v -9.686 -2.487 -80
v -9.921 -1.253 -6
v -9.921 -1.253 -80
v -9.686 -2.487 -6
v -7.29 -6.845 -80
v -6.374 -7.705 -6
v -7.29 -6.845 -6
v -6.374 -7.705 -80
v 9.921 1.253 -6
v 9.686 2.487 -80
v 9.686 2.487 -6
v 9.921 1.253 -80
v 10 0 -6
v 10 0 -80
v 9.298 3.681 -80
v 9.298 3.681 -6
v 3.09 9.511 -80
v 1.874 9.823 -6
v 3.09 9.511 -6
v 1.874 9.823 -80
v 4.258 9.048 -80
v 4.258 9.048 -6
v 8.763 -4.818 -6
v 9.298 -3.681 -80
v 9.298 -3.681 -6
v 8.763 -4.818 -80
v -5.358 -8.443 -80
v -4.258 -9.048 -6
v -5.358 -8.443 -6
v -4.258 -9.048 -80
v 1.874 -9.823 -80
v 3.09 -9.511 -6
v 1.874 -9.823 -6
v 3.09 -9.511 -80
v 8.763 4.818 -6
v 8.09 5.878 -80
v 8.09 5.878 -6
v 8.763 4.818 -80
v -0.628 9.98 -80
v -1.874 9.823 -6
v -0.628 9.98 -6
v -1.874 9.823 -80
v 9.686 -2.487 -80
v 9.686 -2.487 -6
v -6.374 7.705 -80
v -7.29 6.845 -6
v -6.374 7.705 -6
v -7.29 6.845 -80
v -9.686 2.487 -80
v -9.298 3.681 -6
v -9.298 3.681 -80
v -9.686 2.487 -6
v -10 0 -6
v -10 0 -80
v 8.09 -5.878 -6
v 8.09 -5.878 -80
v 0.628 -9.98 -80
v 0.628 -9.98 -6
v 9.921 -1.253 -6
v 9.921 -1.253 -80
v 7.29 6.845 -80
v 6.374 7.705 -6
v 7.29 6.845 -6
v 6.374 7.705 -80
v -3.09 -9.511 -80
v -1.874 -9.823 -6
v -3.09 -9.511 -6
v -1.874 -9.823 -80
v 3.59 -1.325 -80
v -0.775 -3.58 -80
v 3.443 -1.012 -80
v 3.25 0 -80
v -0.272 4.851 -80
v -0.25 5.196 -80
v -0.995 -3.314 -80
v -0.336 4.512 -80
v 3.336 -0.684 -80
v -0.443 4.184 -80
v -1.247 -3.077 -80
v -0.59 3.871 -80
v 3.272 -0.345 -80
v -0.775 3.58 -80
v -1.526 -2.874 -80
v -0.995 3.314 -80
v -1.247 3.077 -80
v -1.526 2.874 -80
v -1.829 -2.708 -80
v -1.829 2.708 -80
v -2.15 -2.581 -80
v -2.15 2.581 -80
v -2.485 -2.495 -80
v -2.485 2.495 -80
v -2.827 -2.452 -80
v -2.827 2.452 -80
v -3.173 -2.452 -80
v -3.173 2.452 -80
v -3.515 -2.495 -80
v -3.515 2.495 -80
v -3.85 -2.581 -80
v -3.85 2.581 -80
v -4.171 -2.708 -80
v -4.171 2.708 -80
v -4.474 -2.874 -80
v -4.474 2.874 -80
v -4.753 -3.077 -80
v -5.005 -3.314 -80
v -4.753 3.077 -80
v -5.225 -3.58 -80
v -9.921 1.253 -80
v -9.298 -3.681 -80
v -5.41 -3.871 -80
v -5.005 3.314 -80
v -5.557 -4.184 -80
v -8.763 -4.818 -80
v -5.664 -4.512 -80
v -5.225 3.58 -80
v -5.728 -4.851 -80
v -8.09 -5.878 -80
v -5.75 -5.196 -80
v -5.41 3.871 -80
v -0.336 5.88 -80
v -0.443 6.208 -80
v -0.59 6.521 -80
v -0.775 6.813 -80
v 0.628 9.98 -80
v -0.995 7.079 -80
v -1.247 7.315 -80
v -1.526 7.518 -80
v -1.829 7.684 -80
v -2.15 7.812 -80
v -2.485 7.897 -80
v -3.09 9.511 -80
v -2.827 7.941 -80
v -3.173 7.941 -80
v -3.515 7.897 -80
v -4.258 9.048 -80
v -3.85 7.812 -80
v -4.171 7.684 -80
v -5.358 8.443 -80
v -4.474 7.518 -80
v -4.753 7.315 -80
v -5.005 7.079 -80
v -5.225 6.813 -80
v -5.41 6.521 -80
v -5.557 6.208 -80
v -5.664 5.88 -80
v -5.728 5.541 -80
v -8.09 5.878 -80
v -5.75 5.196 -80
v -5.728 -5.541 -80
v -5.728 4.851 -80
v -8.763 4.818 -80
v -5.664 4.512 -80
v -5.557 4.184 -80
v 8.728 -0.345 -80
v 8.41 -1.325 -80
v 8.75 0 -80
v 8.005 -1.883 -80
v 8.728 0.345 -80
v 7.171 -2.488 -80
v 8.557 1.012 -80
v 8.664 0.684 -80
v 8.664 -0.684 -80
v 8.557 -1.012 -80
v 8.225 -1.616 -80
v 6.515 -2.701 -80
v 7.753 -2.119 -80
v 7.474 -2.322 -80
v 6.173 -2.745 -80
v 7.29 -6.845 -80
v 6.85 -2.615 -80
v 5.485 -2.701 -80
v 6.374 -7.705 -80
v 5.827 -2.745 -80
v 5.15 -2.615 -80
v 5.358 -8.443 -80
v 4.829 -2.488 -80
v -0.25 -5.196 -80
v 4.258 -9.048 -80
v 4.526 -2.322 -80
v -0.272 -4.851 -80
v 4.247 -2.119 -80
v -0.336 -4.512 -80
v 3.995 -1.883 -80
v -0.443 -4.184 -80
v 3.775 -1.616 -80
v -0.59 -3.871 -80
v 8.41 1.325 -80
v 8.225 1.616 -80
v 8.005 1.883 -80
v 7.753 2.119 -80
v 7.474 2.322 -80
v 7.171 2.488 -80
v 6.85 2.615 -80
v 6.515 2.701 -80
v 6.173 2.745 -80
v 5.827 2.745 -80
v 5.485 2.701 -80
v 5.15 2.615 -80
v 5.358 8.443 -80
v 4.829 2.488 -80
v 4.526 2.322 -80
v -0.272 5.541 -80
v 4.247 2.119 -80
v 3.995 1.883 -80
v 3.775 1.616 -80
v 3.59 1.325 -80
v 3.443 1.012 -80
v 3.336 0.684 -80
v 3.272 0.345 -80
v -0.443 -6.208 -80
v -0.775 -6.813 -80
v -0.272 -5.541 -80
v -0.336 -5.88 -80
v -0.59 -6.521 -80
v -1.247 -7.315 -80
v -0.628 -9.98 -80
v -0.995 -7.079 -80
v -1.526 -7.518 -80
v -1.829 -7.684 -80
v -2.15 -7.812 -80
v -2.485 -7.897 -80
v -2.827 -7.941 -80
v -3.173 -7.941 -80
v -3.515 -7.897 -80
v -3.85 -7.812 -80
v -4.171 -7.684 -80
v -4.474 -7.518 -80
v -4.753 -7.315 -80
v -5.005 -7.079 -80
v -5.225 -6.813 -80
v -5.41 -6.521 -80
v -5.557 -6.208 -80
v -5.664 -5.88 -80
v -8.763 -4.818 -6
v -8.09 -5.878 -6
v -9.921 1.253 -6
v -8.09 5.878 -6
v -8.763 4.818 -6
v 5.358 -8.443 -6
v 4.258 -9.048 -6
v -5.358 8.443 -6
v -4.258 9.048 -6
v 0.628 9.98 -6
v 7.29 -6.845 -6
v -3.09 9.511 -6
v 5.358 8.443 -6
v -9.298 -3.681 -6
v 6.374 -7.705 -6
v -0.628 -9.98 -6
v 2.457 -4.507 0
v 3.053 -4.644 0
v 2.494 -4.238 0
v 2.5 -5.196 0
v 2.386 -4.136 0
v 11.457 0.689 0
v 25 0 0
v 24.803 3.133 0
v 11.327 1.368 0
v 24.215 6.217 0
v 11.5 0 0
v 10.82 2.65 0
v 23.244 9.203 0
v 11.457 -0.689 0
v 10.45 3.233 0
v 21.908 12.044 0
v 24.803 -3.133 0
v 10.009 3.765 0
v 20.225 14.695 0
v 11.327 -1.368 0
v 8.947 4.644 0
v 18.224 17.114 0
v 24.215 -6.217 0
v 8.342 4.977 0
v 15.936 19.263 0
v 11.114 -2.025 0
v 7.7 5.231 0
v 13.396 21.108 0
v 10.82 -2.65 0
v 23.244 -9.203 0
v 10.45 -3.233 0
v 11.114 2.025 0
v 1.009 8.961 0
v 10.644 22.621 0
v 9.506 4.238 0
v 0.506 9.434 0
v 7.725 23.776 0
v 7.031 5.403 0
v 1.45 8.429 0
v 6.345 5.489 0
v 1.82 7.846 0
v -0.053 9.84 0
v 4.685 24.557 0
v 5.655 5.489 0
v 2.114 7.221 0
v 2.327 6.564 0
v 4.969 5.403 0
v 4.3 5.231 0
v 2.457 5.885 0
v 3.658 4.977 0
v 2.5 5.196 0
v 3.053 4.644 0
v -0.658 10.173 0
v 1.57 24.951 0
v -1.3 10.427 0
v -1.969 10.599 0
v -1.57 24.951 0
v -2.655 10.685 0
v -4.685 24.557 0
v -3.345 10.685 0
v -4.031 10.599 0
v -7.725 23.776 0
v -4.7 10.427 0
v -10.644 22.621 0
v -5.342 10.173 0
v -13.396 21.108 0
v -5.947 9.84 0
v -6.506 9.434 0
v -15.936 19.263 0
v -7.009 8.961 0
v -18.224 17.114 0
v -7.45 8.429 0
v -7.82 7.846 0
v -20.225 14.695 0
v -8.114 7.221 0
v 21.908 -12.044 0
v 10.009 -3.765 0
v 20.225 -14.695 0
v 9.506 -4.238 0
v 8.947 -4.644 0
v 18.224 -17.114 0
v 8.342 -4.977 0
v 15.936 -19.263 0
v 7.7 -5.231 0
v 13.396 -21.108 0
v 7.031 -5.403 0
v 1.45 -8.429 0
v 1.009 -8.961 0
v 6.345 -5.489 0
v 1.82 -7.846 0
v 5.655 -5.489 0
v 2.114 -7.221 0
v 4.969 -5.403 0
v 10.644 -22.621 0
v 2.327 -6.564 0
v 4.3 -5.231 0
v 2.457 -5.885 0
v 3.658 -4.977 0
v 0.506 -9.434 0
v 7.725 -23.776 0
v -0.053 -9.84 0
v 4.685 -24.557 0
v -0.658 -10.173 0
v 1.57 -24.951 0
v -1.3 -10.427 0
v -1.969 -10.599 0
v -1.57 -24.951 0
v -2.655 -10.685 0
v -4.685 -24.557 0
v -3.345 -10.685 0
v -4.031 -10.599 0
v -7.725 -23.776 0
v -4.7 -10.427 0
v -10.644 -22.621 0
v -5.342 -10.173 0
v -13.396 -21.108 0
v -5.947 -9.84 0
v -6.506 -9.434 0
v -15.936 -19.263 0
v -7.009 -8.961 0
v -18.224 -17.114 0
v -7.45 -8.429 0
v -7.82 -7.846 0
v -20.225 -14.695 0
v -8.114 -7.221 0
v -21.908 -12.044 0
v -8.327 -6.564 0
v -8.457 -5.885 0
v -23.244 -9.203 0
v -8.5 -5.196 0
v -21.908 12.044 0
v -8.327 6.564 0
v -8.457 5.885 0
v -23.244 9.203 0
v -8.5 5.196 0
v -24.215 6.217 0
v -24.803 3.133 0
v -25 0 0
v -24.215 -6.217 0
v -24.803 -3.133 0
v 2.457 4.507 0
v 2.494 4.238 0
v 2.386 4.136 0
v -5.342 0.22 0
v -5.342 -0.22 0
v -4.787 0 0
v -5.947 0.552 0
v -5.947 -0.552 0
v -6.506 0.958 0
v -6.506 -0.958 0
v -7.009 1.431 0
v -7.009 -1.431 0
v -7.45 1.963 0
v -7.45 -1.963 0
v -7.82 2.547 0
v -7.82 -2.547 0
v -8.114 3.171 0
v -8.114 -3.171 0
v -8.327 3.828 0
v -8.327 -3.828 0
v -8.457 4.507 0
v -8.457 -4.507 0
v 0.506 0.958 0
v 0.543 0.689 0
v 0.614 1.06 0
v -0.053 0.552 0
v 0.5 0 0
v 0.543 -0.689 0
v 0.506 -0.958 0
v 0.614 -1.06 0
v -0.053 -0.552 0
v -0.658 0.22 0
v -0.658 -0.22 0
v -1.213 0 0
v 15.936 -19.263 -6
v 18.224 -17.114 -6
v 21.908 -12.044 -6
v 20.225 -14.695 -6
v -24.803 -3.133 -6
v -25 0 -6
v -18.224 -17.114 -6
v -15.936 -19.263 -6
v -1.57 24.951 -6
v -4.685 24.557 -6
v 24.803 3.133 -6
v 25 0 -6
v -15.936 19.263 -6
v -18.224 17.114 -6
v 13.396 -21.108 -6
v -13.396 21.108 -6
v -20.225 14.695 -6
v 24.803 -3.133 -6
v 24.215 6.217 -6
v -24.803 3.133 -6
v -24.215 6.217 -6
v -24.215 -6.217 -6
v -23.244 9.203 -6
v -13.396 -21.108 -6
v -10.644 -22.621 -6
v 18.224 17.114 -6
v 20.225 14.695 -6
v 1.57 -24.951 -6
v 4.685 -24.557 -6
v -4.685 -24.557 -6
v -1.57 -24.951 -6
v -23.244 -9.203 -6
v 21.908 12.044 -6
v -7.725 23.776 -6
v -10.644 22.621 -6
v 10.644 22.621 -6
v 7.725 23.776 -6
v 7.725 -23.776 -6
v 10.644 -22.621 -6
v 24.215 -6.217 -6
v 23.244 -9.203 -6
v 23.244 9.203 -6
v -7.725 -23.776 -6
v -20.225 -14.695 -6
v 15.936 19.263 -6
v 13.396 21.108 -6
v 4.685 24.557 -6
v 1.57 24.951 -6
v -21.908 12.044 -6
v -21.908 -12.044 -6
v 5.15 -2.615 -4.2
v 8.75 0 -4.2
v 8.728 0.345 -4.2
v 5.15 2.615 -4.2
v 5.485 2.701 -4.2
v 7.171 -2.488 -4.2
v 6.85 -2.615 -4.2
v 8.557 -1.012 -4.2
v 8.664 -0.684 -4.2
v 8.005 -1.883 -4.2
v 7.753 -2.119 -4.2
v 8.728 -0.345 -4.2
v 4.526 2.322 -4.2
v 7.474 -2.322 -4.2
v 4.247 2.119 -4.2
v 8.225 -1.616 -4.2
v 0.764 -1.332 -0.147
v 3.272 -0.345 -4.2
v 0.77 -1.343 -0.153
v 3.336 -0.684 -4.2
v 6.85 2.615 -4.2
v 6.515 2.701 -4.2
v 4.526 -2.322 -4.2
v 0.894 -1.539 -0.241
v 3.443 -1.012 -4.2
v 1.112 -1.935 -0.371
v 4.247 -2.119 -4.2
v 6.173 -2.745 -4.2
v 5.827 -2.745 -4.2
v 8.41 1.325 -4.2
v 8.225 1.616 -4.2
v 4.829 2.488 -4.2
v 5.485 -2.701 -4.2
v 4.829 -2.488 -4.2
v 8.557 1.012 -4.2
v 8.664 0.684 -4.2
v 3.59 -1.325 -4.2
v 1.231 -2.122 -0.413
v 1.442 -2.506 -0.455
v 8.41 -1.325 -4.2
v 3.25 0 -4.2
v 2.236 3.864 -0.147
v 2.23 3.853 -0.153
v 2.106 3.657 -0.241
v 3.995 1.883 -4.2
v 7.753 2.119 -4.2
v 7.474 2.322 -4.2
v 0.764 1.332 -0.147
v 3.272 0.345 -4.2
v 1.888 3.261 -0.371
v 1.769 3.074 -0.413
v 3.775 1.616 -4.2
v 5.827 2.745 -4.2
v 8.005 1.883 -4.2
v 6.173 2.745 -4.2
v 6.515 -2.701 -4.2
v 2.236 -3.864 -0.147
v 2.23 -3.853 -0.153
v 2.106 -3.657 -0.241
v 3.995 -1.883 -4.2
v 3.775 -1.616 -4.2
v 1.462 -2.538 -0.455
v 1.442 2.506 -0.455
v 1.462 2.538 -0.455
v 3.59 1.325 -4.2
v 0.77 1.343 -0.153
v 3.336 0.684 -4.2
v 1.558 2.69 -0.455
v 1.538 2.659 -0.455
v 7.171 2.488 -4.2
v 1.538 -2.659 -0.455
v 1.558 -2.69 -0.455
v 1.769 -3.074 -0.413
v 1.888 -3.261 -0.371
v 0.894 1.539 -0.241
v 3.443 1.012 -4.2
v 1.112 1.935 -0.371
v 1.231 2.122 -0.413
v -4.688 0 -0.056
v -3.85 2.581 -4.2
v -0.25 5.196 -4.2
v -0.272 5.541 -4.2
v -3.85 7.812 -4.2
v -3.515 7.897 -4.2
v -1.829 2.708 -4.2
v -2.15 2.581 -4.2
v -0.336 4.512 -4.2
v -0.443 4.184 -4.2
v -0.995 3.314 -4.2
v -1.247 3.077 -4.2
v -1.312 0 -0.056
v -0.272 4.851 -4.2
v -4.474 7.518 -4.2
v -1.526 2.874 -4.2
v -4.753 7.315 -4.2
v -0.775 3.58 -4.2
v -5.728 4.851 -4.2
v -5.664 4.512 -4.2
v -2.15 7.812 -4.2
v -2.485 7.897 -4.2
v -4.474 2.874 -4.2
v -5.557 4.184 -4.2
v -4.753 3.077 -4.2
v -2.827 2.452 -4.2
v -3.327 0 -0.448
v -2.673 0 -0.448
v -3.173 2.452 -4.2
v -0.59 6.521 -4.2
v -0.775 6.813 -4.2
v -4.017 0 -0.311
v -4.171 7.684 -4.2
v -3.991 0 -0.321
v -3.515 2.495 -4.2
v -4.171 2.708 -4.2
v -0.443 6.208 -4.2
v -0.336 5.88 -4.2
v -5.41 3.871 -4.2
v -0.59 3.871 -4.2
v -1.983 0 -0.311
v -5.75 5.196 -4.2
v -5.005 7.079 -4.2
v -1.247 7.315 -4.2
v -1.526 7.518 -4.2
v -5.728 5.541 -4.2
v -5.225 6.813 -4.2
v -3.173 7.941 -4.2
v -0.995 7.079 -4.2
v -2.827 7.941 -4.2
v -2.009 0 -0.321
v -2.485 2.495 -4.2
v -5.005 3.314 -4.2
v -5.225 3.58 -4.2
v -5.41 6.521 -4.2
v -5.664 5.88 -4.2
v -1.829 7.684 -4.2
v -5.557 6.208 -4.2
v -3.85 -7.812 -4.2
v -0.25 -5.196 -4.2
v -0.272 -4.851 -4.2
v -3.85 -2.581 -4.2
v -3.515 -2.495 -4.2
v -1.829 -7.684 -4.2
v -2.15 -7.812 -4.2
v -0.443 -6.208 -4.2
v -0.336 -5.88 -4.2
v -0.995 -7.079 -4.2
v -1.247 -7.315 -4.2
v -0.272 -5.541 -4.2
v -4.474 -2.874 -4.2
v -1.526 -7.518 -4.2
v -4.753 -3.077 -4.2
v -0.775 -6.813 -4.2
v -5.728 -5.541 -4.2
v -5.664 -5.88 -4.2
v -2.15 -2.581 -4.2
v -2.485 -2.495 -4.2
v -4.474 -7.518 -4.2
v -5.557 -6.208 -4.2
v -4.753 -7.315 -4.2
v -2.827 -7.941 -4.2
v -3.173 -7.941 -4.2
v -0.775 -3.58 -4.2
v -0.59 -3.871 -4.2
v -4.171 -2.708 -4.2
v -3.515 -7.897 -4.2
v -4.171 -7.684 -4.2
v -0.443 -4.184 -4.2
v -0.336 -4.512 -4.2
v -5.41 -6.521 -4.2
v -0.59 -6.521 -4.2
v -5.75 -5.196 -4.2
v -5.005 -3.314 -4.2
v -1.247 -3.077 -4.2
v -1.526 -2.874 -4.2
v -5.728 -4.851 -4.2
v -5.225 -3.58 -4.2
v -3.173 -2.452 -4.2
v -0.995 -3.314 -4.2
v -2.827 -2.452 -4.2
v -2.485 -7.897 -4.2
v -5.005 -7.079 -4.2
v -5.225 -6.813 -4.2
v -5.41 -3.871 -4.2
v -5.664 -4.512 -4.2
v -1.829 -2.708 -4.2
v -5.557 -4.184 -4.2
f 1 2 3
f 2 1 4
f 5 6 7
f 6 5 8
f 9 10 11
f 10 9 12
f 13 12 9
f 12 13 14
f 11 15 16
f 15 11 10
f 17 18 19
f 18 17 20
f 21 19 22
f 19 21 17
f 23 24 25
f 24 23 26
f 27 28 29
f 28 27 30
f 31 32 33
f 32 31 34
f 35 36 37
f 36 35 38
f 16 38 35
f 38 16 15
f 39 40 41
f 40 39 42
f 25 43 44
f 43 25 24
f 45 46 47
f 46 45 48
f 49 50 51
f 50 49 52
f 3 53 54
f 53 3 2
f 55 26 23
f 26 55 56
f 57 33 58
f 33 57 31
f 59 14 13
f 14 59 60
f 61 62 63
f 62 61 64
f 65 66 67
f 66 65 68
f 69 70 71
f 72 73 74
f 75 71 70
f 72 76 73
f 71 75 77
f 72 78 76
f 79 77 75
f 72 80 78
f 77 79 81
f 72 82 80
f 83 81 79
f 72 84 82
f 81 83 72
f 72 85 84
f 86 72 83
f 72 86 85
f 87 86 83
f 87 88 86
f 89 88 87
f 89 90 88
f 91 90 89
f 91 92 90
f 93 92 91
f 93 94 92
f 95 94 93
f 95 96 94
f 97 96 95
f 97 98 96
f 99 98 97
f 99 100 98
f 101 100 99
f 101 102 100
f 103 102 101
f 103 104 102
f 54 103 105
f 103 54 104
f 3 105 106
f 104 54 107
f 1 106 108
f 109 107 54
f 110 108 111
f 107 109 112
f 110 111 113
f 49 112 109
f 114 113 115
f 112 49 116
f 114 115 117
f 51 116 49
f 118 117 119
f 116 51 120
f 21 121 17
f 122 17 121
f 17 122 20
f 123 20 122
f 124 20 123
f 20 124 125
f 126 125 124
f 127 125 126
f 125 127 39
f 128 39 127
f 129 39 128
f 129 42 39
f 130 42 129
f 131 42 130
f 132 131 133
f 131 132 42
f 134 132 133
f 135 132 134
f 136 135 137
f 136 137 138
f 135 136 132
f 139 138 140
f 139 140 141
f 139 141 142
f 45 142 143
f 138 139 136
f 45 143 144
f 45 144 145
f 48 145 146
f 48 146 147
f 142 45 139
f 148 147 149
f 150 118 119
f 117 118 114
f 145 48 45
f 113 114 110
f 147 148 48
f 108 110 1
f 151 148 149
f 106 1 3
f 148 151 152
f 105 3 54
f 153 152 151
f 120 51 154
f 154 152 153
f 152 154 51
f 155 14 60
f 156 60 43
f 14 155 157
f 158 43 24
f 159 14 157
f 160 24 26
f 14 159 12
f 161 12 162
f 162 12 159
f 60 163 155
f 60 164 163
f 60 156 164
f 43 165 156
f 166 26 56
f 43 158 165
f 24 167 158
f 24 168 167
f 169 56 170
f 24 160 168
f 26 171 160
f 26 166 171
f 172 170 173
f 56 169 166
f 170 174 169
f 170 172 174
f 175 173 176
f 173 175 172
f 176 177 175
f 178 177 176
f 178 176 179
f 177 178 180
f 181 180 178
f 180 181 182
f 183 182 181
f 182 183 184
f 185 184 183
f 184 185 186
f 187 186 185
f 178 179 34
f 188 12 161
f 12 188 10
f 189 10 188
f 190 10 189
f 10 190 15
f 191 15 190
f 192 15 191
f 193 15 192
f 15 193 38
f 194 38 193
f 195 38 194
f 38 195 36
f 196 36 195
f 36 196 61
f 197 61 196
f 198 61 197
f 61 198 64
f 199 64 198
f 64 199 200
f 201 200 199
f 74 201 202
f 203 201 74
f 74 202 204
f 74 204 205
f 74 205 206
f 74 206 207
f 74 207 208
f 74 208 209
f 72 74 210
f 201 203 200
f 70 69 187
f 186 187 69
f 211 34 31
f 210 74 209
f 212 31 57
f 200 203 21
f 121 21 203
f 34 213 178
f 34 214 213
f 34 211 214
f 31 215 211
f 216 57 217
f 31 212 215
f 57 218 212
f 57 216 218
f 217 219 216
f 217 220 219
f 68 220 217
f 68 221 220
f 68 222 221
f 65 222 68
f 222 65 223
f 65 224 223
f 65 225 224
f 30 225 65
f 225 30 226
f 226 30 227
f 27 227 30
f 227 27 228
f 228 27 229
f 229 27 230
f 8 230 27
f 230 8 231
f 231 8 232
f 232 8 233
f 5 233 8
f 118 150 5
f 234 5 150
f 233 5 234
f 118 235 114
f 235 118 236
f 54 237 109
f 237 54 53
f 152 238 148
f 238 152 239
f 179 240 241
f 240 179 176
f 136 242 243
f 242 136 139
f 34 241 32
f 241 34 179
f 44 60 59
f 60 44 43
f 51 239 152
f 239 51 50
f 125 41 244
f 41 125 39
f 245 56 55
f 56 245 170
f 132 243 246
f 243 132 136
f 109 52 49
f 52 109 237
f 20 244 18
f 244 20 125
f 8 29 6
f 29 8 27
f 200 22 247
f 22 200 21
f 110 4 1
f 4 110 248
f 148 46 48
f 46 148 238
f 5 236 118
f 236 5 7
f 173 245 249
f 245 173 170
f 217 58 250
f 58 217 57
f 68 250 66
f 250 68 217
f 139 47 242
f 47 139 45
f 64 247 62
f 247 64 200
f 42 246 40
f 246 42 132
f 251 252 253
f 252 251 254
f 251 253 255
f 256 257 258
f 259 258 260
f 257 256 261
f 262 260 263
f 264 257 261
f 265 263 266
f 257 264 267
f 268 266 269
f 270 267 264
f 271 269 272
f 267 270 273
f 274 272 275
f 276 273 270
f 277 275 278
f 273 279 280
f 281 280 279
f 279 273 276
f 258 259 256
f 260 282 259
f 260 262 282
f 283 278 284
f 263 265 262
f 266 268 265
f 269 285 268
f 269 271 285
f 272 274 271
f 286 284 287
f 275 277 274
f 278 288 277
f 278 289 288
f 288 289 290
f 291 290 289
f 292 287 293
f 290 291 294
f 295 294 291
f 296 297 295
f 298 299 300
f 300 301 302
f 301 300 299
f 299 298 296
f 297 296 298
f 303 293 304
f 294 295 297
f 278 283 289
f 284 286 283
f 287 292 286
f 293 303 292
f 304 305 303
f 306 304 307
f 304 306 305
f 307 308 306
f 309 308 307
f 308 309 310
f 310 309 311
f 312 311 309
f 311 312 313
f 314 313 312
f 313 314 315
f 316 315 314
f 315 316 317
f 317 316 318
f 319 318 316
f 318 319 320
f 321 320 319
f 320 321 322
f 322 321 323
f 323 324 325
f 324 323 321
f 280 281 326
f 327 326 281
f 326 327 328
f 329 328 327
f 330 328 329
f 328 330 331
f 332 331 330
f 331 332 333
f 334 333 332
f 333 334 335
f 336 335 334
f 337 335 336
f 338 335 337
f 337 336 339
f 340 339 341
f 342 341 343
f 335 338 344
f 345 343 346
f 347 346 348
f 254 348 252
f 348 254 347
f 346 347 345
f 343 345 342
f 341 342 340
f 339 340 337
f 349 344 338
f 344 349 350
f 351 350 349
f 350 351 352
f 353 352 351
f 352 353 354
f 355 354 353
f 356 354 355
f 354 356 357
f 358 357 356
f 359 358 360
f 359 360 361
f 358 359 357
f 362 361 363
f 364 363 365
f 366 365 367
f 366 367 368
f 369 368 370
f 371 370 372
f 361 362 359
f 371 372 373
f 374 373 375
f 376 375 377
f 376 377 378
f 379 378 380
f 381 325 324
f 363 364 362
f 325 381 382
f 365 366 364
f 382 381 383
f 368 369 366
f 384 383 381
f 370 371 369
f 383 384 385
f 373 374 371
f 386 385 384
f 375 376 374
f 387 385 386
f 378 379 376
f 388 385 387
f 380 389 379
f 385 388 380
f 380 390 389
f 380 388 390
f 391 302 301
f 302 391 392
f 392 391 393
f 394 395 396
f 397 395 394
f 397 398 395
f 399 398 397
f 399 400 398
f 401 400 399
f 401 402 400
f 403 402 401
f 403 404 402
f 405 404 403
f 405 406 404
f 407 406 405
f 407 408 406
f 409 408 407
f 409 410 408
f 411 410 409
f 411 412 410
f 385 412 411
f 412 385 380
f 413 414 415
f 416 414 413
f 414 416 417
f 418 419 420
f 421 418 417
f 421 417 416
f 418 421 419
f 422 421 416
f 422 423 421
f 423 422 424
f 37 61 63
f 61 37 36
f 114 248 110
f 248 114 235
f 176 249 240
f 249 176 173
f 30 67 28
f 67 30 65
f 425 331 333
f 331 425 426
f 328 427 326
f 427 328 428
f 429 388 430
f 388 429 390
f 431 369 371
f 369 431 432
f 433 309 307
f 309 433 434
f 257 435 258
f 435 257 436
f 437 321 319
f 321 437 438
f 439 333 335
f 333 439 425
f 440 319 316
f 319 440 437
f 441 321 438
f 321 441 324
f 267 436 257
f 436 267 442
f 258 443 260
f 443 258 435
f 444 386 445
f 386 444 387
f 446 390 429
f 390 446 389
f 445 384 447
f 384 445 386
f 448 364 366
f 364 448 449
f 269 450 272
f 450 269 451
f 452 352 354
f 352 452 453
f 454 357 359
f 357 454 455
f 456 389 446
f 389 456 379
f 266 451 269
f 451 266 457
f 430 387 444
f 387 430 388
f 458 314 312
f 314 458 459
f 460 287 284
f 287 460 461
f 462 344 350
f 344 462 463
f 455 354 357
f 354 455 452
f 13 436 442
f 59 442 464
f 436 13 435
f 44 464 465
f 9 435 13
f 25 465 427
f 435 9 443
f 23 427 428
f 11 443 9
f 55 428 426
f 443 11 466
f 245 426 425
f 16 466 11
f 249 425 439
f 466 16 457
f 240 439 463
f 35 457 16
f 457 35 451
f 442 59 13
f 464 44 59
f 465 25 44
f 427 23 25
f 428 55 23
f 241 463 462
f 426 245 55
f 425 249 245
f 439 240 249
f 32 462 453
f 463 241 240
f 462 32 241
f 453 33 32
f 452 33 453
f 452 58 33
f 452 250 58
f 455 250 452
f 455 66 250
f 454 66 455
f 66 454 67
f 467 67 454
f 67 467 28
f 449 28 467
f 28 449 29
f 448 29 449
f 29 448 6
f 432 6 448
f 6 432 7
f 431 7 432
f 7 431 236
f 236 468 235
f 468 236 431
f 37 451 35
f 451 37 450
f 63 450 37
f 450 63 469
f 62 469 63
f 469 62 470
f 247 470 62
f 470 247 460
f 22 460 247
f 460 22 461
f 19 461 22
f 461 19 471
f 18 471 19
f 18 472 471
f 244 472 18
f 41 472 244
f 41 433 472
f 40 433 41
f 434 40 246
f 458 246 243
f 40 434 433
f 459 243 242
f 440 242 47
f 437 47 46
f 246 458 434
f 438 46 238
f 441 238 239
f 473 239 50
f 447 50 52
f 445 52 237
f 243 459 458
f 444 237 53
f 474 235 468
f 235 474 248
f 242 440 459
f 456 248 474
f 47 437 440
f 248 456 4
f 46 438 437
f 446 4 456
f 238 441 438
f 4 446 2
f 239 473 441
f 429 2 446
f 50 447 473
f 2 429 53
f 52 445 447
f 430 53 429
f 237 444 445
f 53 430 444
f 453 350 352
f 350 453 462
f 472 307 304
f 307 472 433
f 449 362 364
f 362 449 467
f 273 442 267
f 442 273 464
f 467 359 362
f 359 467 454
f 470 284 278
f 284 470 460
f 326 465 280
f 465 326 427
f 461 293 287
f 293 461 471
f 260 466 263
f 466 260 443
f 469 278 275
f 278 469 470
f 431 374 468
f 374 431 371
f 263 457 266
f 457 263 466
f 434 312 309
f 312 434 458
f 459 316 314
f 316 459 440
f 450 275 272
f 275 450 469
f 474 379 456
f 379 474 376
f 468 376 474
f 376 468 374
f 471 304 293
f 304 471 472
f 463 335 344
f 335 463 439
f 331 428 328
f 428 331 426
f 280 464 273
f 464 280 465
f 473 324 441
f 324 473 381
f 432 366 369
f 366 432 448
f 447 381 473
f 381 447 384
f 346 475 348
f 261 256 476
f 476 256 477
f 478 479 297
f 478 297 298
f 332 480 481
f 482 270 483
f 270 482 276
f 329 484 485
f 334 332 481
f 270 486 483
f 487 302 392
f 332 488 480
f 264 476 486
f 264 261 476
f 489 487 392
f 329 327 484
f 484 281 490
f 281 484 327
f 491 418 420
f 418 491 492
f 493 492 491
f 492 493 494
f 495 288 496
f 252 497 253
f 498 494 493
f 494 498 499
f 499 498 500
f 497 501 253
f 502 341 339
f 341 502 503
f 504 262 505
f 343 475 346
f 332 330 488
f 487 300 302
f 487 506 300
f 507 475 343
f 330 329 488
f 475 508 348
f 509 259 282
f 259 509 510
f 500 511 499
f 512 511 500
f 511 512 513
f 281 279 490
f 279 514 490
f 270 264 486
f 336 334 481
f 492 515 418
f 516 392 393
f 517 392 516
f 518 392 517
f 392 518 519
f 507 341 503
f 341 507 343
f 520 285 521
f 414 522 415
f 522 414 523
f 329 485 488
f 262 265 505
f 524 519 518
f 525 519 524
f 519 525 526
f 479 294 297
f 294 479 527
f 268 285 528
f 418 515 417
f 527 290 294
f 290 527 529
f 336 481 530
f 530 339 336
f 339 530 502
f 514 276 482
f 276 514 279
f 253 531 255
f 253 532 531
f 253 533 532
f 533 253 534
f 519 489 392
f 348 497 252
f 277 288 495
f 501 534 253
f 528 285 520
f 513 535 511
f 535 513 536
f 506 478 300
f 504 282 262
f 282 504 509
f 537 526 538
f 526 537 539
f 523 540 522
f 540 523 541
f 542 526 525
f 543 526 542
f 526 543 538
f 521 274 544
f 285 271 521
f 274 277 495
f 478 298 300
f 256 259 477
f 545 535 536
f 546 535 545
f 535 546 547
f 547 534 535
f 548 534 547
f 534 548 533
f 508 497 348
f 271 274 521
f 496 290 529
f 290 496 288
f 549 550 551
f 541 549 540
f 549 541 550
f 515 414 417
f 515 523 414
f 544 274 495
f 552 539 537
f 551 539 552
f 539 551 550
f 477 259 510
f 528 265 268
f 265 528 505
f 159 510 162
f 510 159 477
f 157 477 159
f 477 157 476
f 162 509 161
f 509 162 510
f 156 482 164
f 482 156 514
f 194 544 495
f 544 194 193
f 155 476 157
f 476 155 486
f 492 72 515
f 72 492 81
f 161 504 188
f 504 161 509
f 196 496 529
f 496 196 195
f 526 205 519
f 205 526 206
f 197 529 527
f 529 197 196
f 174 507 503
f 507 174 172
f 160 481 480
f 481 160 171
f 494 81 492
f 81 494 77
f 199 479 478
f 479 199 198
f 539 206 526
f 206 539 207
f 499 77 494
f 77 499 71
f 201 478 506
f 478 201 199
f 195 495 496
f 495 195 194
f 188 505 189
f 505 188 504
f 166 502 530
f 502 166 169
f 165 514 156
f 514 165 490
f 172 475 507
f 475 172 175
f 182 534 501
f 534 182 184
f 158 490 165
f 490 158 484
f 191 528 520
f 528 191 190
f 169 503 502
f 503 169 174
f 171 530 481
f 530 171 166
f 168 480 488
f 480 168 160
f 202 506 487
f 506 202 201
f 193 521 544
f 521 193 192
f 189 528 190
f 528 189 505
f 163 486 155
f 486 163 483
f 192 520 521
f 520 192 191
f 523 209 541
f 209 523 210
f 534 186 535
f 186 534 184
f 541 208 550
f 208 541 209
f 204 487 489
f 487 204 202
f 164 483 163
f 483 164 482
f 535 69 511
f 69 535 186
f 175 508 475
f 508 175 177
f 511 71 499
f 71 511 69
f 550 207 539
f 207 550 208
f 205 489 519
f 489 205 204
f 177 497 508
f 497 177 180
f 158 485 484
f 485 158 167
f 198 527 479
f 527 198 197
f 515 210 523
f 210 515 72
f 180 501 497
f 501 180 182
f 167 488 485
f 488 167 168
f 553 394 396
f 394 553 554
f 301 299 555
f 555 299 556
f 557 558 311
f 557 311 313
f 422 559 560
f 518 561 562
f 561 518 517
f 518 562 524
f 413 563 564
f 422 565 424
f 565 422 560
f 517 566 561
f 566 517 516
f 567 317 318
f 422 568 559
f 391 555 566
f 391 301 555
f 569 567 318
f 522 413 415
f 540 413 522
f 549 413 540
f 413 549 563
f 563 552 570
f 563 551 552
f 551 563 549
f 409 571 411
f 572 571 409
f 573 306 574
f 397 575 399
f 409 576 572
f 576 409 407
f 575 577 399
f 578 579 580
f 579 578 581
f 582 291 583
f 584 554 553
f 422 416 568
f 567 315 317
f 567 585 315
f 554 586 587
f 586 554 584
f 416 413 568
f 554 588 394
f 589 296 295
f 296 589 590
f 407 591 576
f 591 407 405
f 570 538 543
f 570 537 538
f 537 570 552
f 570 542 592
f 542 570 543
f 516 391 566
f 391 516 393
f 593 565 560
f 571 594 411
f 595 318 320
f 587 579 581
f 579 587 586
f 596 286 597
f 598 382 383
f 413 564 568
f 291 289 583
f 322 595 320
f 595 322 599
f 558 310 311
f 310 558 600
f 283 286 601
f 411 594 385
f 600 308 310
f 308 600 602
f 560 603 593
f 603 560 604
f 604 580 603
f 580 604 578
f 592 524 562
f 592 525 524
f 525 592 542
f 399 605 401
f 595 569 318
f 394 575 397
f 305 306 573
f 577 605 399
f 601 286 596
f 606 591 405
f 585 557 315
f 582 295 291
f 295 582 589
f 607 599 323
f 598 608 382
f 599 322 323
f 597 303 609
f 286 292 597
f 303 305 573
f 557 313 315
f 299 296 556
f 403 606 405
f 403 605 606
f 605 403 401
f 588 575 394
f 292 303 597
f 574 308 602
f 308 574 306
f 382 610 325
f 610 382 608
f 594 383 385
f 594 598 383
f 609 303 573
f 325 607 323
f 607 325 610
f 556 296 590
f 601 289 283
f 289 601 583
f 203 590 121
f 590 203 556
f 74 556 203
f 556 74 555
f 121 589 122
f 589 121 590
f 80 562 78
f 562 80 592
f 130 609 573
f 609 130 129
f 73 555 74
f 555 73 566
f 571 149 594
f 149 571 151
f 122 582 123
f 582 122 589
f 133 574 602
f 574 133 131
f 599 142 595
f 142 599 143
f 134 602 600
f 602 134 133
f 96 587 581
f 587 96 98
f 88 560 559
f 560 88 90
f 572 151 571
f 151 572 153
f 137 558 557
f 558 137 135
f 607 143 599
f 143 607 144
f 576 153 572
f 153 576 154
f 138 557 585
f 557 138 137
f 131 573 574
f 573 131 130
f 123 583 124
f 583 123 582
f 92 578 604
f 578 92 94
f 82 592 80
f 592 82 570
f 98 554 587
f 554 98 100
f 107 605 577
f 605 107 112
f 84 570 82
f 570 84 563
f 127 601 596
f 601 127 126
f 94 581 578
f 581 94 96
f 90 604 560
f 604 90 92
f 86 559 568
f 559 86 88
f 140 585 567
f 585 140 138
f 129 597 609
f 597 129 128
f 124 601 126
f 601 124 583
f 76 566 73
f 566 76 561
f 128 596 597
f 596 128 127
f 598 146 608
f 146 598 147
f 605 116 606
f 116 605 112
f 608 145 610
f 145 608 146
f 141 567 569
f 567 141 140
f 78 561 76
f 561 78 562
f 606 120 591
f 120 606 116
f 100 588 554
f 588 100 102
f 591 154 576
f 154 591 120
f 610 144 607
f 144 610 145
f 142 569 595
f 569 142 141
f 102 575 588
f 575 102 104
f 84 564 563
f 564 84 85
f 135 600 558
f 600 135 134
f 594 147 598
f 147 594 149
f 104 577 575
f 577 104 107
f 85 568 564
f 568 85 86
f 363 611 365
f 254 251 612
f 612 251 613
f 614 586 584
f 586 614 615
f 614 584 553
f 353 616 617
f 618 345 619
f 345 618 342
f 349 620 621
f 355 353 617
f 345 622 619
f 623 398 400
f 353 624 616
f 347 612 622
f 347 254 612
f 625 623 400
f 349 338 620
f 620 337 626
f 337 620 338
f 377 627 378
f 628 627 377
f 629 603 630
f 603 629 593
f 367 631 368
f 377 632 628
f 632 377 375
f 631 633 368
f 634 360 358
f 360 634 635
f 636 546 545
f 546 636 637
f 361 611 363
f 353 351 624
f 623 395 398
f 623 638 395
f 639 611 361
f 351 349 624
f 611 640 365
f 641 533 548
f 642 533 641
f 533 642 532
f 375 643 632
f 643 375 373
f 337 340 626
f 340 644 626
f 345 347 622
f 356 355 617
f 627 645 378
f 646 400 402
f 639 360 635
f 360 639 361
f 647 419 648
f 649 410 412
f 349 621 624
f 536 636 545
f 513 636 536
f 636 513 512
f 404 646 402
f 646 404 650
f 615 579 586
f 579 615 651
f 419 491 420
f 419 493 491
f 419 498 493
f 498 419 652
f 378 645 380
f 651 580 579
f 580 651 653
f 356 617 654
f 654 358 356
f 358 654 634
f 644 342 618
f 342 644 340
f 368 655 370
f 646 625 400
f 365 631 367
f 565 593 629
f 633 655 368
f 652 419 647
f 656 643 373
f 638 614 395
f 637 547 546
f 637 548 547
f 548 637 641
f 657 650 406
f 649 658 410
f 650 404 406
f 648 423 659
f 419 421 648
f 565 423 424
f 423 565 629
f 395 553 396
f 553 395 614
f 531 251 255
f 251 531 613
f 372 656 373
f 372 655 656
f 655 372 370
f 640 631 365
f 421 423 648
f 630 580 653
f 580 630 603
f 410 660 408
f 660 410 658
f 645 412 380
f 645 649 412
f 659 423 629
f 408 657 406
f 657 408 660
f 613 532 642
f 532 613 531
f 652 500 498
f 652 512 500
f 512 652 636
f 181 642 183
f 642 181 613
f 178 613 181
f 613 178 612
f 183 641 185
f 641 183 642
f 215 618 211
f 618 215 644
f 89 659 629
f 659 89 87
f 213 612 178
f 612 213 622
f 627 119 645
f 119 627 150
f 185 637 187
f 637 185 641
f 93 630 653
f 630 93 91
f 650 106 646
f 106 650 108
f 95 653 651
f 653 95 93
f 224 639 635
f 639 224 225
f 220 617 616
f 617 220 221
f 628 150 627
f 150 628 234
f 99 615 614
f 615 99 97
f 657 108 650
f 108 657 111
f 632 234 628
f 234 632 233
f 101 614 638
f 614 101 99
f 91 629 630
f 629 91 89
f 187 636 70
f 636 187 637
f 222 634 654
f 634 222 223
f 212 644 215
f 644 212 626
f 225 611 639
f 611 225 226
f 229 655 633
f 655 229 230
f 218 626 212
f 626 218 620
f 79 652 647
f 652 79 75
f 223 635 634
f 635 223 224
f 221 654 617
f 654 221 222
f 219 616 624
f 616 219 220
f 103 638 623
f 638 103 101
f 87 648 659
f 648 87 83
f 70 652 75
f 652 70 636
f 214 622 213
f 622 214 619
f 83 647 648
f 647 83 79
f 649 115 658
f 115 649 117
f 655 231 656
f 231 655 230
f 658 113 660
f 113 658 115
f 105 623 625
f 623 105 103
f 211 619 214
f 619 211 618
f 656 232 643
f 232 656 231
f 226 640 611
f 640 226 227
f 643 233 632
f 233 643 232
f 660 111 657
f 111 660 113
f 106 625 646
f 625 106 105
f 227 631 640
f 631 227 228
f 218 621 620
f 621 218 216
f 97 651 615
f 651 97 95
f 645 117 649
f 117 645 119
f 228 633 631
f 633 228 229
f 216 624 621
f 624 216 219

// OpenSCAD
$fn = 50;


difference() {
	union() {
		translate(v = [0, 0, -80.0000000000]) {
			cylinder(h = 80, r = 10.0000000000);
		}
		translate(v = [0, 0, -6.0000000000]) {
			cylinder(h = 6, r = 25.0000000000);
		}
	}
	union() {
		translate(v = [6.0000000000, 0.0000000000, 0]) {
			rotate(a = [0, 0, 0]) {
				difference() {
					union() {
						#translate(v = [0, 0, -80.0000000000]) {
							cylinder(h = 80, r = 2.2500000000);
						}
						#translate(v = [0, 0, -4.2000000000]) {
							cylinder(h = 4.2000000000, r = 10.0000000000, r1 = 2.7500000000, r2 = 5.5000000000);
						}
						#translate(v = [0, 0, -80.0000000000]) {
							cylinder(h = 80, r = 2.7500000000);
						}
						#translate(v = [0, 0, -80.0000000000]) {
							cylinder(h = 80, r = 2.2500000000);
						}
					}
					union();
				}
			}
		}
		translate(v = [-3.0000000000, 5.1961524227, 0]) {
			rotate(a = [0, 0, 0]) {
				difference() {
					union() {
						#translate(v = [0, 0, -80.0000000000]) {
							cylinder(h = 80, r = 2.2500000000);
						}
						#translate(v = [0, 0, -4.2000000000]) {
							cylinder(h = 4.2000000000, r = 10.0000000000, r1 = 2.7500000000, r2 = 5.5000000000);
						}
						#translate(v = [0, 0, -80.0000000000]) {
							cylinder(h = 80, r = 2.7500000000);
						}
						#translate(v = [0, 0, -80.0000000000]) {
							cylinder(h = 80, r = 2.2500000000);
						}
					}
					union();
				}
			}
		}
		translate(v = [-3.0000000000, -5.1961524227, 0]) {
			rotate(a = [0, 0, 0]) {
				difference() {
					union() {
						#translate(v = [0, 0, -80.0000000000]) {
							cylinder(h = 80, r = 2.2500000000);
						}
						#translate(v = [0, 0, -4.2000000000]) {
							cylinder(h = 4.2000000000, r = 10.0000000000, r1 = 2.7500000000, r2 = 5.5000000000);
						}
						#translate(v = [0, 0, -80.0000000000]) {
							cylinder(h = 80, r = 2.7500000000);
						}
						#translate(v = [0, 0, -80.0000000000]) {
							cylinder(h = 80, r = 2.2500000000);
						}
					}
					union();
				}
			}
		}
	}
}
